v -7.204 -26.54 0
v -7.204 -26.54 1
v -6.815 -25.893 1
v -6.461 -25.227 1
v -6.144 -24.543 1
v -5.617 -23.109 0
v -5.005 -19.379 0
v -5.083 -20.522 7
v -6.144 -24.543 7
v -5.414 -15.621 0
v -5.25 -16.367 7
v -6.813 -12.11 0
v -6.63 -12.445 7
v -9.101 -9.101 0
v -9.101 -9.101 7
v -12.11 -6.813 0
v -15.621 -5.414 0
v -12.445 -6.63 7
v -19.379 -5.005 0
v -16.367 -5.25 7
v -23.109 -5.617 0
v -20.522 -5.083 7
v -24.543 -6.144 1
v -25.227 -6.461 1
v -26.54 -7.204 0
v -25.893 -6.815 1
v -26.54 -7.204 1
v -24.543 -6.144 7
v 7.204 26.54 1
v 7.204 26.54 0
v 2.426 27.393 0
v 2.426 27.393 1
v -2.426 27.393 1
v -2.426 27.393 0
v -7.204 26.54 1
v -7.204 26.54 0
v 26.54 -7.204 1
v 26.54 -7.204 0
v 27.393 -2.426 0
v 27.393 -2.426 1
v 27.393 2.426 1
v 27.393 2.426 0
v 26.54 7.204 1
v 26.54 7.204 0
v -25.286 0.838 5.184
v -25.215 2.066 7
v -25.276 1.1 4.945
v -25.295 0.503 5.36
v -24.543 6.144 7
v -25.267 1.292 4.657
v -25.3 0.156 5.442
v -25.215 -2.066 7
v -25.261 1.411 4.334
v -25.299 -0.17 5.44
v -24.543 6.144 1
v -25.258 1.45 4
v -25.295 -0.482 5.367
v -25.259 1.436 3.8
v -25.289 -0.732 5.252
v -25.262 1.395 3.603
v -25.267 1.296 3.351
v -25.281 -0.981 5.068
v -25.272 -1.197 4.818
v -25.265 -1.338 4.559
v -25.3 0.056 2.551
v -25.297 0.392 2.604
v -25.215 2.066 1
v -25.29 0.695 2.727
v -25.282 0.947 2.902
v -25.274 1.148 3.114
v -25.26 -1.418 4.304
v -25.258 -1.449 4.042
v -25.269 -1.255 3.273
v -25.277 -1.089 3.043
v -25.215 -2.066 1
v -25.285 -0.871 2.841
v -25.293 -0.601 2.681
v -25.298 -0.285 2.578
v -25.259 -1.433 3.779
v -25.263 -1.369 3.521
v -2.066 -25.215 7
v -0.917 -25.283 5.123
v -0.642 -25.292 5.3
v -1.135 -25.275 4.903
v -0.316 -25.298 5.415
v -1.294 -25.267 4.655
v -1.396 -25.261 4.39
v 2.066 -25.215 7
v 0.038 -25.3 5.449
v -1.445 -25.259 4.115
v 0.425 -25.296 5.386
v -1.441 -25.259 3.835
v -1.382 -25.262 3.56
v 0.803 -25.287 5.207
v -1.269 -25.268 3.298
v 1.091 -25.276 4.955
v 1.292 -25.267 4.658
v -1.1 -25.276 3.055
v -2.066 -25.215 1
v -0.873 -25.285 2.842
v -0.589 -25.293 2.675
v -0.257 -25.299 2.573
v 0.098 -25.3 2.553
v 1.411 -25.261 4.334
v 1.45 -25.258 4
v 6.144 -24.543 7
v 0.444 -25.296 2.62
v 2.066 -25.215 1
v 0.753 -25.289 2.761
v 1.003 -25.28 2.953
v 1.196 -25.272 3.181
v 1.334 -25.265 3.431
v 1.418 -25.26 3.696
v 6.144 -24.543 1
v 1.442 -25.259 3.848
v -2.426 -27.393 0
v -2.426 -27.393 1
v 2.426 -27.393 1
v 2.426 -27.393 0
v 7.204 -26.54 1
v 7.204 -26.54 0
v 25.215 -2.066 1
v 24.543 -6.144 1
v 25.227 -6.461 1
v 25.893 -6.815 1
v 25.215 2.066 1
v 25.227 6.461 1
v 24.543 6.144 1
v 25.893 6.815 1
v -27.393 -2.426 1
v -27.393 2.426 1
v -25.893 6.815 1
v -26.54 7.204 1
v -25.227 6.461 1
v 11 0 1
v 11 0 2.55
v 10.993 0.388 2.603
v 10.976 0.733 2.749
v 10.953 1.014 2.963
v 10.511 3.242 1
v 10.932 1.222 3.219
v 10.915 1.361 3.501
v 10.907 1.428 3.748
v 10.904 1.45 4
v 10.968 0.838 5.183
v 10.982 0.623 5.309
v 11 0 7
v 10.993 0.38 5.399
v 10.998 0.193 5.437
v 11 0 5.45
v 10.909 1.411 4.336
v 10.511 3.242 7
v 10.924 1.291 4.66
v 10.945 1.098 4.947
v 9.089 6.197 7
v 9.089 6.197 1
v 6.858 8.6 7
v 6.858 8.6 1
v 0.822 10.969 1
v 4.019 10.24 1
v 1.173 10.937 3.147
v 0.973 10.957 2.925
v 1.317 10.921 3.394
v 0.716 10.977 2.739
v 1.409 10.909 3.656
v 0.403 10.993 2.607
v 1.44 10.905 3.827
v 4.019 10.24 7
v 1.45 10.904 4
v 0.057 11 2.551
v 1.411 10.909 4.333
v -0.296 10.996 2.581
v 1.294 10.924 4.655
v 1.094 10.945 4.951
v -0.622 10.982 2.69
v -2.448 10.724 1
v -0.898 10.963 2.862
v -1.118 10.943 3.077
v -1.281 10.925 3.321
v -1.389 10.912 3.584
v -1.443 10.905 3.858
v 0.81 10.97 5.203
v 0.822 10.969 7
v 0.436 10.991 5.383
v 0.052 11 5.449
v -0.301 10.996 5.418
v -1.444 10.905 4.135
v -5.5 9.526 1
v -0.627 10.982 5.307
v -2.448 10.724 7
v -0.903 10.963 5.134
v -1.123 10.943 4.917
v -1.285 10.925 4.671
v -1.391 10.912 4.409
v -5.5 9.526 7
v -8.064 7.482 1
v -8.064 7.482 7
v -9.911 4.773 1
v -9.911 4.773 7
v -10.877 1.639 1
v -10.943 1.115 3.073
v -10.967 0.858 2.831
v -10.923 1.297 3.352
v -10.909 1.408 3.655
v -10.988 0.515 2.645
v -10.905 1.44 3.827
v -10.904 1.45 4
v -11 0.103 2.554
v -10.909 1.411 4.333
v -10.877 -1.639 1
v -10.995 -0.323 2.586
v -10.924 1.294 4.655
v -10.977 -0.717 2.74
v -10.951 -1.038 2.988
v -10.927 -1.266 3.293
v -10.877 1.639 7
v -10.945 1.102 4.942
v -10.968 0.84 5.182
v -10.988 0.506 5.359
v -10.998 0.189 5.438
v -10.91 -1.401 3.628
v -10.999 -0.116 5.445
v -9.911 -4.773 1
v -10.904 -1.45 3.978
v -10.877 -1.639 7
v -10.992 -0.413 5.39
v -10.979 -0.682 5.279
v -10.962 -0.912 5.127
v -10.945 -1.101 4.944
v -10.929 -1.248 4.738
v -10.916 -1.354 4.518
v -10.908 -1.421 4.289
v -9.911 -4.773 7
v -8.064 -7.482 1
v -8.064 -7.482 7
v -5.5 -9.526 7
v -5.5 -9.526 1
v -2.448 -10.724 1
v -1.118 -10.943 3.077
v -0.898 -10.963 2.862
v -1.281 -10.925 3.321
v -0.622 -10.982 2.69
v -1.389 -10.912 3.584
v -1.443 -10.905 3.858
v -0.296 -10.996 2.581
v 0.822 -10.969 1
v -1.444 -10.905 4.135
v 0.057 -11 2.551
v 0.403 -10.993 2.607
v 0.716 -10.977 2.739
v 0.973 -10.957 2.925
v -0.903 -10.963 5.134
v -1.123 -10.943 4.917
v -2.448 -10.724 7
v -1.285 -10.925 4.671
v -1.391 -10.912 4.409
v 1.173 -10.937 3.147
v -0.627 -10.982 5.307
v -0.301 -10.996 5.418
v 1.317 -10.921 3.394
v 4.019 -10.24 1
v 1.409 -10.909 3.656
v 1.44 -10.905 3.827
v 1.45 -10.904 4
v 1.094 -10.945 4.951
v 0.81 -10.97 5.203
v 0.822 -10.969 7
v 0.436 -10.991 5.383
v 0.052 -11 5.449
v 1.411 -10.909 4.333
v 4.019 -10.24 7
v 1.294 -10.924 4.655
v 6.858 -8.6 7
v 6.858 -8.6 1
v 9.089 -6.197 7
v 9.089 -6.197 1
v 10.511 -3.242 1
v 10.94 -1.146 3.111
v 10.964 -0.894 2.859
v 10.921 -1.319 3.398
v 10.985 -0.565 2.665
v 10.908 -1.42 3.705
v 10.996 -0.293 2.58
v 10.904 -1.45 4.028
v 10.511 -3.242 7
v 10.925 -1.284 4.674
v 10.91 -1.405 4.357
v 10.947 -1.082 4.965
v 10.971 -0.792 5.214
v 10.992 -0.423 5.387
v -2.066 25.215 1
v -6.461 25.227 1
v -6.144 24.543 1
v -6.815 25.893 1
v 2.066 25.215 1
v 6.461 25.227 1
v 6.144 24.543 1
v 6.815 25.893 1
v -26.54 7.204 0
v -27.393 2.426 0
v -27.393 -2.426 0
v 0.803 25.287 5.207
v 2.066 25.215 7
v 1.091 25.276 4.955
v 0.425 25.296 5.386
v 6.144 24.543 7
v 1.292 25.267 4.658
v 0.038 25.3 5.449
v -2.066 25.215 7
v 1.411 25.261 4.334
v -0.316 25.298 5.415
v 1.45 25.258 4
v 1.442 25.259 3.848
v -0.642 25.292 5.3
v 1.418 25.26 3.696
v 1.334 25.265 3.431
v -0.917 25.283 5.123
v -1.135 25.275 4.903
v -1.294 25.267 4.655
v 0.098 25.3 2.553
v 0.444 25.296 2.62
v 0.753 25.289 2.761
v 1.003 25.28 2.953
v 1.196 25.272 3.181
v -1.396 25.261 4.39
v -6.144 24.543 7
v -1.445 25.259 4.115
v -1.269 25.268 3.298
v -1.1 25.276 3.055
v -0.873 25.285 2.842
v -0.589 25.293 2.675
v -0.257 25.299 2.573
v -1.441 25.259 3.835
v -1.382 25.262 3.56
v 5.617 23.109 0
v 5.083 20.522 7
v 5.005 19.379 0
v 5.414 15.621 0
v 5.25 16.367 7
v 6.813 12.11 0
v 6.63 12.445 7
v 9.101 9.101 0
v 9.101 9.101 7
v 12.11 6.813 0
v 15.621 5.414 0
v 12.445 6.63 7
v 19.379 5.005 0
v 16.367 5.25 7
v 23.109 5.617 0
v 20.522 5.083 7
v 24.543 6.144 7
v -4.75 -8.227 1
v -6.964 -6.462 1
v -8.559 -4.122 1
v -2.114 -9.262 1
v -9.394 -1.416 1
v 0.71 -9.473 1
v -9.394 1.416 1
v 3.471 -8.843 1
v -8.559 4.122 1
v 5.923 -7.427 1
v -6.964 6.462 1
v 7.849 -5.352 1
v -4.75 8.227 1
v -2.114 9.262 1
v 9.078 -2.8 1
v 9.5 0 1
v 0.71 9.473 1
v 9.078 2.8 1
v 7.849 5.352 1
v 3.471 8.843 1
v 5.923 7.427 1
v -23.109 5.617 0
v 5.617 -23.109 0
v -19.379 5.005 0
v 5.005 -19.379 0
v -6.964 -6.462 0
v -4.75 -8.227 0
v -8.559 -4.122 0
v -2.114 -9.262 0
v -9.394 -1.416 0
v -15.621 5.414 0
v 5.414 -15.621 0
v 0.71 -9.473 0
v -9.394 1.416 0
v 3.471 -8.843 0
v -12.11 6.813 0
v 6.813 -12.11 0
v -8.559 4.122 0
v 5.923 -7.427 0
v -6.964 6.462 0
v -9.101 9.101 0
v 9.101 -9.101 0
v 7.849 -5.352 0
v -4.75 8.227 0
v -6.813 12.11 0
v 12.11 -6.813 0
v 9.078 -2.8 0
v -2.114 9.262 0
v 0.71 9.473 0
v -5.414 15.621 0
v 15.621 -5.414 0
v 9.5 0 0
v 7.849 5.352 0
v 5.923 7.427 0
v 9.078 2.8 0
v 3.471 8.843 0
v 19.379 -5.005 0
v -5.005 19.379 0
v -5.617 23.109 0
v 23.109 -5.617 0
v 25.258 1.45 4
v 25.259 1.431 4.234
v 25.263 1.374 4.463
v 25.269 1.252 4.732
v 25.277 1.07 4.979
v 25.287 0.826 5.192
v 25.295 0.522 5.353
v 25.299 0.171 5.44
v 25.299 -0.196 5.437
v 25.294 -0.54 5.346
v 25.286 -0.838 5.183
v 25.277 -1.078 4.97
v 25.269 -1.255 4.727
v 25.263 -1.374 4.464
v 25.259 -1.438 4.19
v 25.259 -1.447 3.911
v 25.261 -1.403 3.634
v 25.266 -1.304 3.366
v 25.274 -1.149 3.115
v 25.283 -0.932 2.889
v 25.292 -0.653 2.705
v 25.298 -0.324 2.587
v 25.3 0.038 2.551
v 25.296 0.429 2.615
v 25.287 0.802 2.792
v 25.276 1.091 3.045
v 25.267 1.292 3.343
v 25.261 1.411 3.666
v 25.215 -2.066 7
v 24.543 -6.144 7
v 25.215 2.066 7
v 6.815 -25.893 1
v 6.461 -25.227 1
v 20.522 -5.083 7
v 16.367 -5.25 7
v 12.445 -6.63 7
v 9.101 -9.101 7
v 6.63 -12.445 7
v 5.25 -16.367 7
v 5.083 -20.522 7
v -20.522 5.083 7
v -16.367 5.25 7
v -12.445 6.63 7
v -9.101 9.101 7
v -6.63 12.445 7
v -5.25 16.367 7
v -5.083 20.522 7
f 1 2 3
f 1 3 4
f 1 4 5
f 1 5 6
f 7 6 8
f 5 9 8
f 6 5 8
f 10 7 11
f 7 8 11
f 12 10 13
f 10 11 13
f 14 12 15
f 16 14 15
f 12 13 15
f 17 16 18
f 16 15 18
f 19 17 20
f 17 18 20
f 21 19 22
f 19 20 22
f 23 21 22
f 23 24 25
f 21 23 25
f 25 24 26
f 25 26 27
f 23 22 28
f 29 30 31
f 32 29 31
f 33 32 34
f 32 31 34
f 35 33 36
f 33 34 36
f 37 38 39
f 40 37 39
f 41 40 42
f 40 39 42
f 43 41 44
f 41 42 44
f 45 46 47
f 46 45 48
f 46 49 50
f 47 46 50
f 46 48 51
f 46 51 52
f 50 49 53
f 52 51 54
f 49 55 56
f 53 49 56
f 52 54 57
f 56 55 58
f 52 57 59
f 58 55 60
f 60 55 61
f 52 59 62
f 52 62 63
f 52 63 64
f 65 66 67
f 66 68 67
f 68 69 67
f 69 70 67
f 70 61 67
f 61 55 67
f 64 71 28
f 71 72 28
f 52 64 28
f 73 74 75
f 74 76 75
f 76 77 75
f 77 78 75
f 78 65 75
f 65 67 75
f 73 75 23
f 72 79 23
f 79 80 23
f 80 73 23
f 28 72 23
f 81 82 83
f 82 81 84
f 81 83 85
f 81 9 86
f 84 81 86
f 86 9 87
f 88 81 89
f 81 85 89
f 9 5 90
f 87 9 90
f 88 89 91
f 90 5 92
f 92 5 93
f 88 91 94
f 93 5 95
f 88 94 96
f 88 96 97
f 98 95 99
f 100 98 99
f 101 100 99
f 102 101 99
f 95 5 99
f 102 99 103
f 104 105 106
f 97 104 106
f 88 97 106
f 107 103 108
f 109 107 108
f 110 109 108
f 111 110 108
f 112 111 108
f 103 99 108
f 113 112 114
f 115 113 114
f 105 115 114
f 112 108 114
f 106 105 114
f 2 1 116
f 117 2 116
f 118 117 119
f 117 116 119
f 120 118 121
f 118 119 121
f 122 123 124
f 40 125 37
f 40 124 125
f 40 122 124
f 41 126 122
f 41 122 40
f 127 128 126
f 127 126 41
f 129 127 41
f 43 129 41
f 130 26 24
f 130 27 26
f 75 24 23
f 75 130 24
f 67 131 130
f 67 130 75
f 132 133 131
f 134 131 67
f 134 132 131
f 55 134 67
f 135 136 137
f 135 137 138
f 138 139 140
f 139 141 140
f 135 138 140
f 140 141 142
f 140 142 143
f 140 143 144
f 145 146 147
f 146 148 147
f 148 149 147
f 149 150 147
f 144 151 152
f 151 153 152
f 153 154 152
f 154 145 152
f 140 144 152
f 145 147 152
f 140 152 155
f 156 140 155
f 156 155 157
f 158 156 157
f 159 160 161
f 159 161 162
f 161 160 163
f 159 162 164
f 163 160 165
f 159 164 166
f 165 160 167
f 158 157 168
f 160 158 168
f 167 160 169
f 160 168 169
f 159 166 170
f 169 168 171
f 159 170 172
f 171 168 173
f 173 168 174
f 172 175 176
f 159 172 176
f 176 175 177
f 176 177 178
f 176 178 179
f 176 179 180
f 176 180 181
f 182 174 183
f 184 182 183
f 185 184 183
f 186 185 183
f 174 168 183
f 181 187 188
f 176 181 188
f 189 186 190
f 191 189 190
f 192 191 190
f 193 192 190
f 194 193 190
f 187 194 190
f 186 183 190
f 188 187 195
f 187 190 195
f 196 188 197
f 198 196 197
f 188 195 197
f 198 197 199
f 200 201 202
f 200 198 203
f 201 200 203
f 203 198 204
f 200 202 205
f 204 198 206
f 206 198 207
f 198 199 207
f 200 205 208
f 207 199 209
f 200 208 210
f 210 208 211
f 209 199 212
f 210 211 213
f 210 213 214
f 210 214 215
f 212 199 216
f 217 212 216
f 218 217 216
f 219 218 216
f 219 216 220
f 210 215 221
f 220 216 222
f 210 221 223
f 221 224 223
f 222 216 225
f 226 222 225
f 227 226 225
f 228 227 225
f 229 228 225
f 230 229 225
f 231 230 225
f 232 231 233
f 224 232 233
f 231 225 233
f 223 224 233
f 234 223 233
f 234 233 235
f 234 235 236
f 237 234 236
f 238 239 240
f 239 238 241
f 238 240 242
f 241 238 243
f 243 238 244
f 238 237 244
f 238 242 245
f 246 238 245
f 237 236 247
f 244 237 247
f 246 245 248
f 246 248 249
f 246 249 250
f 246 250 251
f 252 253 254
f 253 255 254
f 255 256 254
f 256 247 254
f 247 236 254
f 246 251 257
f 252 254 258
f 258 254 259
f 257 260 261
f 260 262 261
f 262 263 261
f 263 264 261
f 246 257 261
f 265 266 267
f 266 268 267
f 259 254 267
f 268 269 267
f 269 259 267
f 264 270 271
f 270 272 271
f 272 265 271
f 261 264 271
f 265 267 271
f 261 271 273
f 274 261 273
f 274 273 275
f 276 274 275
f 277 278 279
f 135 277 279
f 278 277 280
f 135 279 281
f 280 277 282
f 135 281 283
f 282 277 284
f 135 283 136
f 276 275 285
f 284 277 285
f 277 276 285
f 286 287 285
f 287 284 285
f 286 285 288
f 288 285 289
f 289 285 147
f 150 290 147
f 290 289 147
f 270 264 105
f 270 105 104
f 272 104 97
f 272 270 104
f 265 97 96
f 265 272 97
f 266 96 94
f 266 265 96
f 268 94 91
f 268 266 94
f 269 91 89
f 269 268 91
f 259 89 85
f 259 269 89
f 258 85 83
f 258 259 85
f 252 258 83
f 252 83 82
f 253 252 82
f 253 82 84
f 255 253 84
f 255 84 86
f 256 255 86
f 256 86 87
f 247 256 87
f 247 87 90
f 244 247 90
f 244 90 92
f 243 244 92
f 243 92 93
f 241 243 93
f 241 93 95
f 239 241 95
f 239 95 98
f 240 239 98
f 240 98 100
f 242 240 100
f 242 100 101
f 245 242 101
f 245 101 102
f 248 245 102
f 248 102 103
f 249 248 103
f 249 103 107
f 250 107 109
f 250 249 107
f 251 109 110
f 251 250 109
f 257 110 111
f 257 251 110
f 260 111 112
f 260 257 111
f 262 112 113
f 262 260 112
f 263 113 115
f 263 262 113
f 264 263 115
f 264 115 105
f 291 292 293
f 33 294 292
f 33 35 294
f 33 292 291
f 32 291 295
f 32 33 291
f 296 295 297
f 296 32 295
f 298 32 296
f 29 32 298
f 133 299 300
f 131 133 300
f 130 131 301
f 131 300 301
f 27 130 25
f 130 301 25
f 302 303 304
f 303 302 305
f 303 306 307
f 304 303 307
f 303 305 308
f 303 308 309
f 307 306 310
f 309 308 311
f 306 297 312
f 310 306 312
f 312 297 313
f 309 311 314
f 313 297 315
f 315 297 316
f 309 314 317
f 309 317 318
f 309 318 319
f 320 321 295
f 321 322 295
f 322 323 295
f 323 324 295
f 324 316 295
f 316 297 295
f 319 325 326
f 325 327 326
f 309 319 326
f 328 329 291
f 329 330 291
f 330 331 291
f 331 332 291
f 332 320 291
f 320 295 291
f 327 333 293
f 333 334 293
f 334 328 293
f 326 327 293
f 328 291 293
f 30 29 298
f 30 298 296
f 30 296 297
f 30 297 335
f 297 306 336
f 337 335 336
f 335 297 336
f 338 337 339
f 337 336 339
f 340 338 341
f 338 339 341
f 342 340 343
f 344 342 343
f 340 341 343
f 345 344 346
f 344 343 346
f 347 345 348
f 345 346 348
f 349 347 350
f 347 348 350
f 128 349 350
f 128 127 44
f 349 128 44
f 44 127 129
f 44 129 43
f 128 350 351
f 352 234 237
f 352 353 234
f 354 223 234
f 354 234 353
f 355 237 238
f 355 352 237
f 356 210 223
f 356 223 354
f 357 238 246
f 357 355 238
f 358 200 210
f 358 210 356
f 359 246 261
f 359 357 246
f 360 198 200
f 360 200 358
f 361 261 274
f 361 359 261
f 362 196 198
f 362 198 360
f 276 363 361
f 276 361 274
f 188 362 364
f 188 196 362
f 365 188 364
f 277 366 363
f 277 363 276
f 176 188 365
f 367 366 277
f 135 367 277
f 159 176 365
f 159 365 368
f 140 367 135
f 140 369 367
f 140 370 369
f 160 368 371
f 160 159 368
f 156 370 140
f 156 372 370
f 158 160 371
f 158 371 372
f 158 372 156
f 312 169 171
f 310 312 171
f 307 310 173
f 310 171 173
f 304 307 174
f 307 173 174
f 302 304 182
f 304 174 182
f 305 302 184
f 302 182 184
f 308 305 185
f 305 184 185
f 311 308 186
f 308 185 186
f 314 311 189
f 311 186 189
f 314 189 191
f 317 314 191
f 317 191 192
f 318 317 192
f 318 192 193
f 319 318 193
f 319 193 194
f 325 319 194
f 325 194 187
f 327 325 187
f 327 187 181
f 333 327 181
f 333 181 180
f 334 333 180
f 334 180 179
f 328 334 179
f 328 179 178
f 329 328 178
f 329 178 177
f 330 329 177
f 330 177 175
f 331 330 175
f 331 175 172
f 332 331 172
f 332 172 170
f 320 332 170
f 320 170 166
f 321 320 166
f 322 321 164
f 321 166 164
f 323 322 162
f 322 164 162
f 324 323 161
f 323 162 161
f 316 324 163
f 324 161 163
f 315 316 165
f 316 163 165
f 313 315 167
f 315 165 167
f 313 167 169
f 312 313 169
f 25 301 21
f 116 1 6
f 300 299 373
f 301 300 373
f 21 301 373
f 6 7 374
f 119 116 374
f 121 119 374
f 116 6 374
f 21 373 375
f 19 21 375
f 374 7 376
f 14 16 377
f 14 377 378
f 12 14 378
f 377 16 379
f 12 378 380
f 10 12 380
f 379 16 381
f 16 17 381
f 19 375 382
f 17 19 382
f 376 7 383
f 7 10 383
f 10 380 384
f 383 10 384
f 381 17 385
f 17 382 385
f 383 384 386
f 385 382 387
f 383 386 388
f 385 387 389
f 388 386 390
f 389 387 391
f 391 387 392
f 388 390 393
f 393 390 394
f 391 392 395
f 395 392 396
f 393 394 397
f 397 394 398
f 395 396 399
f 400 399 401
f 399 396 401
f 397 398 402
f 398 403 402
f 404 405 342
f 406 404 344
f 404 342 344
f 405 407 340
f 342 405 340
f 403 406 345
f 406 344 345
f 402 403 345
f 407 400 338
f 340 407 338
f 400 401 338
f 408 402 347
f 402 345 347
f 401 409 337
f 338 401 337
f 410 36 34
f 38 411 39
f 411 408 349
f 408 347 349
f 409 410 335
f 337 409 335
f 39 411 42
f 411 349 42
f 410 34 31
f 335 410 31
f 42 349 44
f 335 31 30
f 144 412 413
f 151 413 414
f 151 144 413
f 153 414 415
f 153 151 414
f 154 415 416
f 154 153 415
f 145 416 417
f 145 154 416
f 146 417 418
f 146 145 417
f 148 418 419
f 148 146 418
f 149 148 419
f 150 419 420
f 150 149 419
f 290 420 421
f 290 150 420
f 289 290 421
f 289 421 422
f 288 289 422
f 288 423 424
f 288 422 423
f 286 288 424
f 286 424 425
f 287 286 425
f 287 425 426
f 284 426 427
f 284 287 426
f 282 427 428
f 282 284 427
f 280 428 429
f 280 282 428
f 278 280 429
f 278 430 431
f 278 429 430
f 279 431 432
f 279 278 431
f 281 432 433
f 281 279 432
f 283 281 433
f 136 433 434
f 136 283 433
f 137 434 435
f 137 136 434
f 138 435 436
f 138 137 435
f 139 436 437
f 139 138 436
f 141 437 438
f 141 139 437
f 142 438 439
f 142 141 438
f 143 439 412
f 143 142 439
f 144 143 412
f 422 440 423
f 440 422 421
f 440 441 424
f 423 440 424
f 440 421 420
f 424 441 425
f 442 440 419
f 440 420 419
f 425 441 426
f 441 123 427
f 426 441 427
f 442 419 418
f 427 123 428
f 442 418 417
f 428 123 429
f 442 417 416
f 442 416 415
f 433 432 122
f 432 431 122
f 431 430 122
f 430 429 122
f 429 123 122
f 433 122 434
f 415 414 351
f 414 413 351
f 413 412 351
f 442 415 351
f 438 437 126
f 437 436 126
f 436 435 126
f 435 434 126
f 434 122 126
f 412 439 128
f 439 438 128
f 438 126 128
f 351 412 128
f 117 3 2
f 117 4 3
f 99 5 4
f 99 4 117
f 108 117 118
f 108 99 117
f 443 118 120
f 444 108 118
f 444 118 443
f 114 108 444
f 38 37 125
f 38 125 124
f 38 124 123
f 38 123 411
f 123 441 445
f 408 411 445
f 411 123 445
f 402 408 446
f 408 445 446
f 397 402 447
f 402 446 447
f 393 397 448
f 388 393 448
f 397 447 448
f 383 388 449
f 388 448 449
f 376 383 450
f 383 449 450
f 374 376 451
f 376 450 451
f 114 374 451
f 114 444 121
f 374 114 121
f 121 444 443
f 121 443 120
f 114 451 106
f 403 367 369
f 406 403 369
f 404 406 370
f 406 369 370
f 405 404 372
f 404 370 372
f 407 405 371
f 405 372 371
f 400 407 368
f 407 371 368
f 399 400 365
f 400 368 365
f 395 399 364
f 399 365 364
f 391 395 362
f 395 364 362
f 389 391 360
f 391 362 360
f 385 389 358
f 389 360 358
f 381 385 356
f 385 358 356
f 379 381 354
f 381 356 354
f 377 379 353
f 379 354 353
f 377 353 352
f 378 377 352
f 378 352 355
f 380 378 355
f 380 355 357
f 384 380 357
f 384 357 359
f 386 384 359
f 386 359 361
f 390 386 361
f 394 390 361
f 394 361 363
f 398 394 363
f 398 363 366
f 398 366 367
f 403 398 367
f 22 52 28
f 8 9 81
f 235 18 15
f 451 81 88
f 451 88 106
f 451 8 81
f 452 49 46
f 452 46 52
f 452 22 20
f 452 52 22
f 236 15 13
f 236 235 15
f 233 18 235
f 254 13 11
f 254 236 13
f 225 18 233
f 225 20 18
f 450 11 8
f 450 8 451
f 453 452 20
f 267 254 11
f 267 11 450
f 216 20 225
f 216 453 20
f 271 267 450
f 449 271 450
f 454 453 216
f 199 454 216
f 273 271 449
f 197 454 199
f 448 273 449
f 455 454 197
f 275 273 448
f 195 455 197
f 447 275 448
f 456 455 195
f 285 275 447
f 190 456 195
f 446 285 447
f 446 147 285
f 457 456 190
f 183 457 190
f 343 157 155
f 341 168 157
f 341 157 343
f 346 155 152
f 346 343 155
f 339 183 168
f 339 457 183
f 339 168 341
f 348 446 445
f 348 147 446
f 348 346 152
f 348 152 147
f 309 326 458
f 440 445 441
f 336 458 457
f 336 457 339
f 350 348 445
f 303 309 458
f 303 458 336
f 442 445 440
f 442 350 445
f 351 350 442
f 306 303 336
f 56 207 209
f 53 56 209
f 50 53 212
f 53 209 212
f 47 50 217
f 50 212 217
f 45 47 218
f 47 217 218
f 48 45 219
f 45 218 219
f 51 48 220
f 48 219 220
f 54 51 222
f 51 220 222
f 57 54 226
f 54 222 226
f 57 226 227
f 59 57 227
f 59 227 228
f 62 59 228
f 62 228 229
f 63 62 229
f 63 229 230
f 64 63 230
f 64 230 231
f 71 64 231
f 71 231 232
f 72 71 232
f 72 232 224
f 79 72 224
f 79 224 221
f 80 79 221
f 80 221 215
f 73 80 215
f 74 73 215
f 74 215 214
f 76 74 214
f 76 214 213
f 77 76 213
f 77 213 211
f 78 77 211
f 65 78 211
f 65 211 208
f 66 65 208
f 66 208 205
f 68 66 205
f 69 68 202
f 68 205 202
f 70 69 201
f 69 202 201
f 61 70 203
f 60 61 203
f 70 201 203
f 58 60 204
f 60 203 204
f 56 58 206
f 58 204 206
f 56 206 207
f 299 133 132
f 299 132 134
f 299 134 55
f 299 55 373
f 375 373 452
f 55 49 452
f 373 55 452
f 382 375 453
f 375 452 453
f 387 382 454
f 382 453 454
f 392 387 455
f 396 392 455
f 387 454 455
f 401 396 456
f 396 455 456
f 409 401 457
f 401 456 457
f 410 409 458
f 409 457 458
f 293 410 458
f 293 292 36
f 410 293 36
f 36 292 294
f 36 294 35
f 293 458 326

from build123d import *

# Parameters (mm, degrees)
SKETCH_R             = 27.5
PAD_DEPTH            = 1
SKETCH001_R          = 25.3
PAD001_DEPTH         = 6
SKETCH002_R          = 11
POCKET_DEPTH         = 6
SKETCH003_R          = 9.5
SKETCH003_R_2        = 14
POCKET001_DEPTH      = 7.001
POCKET001_DEPTH_BACK = -0.001
SKETCH004_R          = 1.45
POCKET002_DEPTH      = 27.501
POCKET002_DEPTH_BACK = -27.501
SKETCH005_R          = 1.45
POCKET003_DEPTH      = 27.501
POCKET003_DEPTH_BACK = -27.501


with BuildPart() as part:
    # Sketch → Pad (new body)
    with BuildSketch(Plane.XY):
        Circle(SKETCH_R)
    extrude(amount=PAD_DEPTH)

    # Sketch001 (on Face3 of Pad) → Pad001 (join)
    with BuildSketch(Plane.XY.offset(1)):
        Circle(SKETCH001_R)
    extrude(amount=PAD001_DEPTH)

    # Sketch002 (on Face5 of Pad001) → Pocket (cut)
    with BuildSketch(Plane.XY.offset(7)):
        Circle(SKETCH002_R)
    extrude(amount=-POCKET_DEPTH, mode=Mode.SUBTRACT)

    # Sketch003 (on Face5 of Pocket) → Pocket001 (cut, two sides)
    with BuildSketch(Plane.XY.offset(7)) as pocket001_sk:
        Circle(SKETCH003_R)
        with Locations((-19, 19)):
            Circle(SKETCH003_R_2)
        with Locations((19, 19)):
            Circle(SKETCH003_R_2)
        with Locations((-19, -19)):
            Circle(SKETCH003_R_2)
        with Locations((19, -19)):
            Circle(SKETCH003_R_2)
    extrude(amount=-POCKET001_DEPTH, mode=Mode.SUBTRACT)
    extrude(pocket001_sk.sketch, amount=-POCKET001_DEPTH_BACK, mode=Mode.SUBTRACT)

    # Sketch004 → Pocket002 (cut, two sides)
    with BuildSketch(Plane.XZ) as pocket002_sk:
        with Locations((0, 4)):
            Circle(SKETCH004_R)
    extrude(amount=-POCKET002_DEPTH, mode=Mode.SUBTRACT)
    extrude(pocket002_sk.sketch, amount=-POCKET002_DEPTH_BACK, mode=Mode.SUBTRACT)

    # Sketch005 → Pocket003 (cut, two sides)
    with BuildSketch(Plane.YZ) as pocket003_sk:
        with Locations((0, 4)):
            Circle(SKETCH005_R)
    extrude(amount=-POCKET003_DEPTH, mode=Mode.SUBTRACT)
    extrude(pocket003_sk.sketch, amount=-POCKET003_DEPTH_BACK, mode=Mode.SUBTRACT)


solid = part.part
